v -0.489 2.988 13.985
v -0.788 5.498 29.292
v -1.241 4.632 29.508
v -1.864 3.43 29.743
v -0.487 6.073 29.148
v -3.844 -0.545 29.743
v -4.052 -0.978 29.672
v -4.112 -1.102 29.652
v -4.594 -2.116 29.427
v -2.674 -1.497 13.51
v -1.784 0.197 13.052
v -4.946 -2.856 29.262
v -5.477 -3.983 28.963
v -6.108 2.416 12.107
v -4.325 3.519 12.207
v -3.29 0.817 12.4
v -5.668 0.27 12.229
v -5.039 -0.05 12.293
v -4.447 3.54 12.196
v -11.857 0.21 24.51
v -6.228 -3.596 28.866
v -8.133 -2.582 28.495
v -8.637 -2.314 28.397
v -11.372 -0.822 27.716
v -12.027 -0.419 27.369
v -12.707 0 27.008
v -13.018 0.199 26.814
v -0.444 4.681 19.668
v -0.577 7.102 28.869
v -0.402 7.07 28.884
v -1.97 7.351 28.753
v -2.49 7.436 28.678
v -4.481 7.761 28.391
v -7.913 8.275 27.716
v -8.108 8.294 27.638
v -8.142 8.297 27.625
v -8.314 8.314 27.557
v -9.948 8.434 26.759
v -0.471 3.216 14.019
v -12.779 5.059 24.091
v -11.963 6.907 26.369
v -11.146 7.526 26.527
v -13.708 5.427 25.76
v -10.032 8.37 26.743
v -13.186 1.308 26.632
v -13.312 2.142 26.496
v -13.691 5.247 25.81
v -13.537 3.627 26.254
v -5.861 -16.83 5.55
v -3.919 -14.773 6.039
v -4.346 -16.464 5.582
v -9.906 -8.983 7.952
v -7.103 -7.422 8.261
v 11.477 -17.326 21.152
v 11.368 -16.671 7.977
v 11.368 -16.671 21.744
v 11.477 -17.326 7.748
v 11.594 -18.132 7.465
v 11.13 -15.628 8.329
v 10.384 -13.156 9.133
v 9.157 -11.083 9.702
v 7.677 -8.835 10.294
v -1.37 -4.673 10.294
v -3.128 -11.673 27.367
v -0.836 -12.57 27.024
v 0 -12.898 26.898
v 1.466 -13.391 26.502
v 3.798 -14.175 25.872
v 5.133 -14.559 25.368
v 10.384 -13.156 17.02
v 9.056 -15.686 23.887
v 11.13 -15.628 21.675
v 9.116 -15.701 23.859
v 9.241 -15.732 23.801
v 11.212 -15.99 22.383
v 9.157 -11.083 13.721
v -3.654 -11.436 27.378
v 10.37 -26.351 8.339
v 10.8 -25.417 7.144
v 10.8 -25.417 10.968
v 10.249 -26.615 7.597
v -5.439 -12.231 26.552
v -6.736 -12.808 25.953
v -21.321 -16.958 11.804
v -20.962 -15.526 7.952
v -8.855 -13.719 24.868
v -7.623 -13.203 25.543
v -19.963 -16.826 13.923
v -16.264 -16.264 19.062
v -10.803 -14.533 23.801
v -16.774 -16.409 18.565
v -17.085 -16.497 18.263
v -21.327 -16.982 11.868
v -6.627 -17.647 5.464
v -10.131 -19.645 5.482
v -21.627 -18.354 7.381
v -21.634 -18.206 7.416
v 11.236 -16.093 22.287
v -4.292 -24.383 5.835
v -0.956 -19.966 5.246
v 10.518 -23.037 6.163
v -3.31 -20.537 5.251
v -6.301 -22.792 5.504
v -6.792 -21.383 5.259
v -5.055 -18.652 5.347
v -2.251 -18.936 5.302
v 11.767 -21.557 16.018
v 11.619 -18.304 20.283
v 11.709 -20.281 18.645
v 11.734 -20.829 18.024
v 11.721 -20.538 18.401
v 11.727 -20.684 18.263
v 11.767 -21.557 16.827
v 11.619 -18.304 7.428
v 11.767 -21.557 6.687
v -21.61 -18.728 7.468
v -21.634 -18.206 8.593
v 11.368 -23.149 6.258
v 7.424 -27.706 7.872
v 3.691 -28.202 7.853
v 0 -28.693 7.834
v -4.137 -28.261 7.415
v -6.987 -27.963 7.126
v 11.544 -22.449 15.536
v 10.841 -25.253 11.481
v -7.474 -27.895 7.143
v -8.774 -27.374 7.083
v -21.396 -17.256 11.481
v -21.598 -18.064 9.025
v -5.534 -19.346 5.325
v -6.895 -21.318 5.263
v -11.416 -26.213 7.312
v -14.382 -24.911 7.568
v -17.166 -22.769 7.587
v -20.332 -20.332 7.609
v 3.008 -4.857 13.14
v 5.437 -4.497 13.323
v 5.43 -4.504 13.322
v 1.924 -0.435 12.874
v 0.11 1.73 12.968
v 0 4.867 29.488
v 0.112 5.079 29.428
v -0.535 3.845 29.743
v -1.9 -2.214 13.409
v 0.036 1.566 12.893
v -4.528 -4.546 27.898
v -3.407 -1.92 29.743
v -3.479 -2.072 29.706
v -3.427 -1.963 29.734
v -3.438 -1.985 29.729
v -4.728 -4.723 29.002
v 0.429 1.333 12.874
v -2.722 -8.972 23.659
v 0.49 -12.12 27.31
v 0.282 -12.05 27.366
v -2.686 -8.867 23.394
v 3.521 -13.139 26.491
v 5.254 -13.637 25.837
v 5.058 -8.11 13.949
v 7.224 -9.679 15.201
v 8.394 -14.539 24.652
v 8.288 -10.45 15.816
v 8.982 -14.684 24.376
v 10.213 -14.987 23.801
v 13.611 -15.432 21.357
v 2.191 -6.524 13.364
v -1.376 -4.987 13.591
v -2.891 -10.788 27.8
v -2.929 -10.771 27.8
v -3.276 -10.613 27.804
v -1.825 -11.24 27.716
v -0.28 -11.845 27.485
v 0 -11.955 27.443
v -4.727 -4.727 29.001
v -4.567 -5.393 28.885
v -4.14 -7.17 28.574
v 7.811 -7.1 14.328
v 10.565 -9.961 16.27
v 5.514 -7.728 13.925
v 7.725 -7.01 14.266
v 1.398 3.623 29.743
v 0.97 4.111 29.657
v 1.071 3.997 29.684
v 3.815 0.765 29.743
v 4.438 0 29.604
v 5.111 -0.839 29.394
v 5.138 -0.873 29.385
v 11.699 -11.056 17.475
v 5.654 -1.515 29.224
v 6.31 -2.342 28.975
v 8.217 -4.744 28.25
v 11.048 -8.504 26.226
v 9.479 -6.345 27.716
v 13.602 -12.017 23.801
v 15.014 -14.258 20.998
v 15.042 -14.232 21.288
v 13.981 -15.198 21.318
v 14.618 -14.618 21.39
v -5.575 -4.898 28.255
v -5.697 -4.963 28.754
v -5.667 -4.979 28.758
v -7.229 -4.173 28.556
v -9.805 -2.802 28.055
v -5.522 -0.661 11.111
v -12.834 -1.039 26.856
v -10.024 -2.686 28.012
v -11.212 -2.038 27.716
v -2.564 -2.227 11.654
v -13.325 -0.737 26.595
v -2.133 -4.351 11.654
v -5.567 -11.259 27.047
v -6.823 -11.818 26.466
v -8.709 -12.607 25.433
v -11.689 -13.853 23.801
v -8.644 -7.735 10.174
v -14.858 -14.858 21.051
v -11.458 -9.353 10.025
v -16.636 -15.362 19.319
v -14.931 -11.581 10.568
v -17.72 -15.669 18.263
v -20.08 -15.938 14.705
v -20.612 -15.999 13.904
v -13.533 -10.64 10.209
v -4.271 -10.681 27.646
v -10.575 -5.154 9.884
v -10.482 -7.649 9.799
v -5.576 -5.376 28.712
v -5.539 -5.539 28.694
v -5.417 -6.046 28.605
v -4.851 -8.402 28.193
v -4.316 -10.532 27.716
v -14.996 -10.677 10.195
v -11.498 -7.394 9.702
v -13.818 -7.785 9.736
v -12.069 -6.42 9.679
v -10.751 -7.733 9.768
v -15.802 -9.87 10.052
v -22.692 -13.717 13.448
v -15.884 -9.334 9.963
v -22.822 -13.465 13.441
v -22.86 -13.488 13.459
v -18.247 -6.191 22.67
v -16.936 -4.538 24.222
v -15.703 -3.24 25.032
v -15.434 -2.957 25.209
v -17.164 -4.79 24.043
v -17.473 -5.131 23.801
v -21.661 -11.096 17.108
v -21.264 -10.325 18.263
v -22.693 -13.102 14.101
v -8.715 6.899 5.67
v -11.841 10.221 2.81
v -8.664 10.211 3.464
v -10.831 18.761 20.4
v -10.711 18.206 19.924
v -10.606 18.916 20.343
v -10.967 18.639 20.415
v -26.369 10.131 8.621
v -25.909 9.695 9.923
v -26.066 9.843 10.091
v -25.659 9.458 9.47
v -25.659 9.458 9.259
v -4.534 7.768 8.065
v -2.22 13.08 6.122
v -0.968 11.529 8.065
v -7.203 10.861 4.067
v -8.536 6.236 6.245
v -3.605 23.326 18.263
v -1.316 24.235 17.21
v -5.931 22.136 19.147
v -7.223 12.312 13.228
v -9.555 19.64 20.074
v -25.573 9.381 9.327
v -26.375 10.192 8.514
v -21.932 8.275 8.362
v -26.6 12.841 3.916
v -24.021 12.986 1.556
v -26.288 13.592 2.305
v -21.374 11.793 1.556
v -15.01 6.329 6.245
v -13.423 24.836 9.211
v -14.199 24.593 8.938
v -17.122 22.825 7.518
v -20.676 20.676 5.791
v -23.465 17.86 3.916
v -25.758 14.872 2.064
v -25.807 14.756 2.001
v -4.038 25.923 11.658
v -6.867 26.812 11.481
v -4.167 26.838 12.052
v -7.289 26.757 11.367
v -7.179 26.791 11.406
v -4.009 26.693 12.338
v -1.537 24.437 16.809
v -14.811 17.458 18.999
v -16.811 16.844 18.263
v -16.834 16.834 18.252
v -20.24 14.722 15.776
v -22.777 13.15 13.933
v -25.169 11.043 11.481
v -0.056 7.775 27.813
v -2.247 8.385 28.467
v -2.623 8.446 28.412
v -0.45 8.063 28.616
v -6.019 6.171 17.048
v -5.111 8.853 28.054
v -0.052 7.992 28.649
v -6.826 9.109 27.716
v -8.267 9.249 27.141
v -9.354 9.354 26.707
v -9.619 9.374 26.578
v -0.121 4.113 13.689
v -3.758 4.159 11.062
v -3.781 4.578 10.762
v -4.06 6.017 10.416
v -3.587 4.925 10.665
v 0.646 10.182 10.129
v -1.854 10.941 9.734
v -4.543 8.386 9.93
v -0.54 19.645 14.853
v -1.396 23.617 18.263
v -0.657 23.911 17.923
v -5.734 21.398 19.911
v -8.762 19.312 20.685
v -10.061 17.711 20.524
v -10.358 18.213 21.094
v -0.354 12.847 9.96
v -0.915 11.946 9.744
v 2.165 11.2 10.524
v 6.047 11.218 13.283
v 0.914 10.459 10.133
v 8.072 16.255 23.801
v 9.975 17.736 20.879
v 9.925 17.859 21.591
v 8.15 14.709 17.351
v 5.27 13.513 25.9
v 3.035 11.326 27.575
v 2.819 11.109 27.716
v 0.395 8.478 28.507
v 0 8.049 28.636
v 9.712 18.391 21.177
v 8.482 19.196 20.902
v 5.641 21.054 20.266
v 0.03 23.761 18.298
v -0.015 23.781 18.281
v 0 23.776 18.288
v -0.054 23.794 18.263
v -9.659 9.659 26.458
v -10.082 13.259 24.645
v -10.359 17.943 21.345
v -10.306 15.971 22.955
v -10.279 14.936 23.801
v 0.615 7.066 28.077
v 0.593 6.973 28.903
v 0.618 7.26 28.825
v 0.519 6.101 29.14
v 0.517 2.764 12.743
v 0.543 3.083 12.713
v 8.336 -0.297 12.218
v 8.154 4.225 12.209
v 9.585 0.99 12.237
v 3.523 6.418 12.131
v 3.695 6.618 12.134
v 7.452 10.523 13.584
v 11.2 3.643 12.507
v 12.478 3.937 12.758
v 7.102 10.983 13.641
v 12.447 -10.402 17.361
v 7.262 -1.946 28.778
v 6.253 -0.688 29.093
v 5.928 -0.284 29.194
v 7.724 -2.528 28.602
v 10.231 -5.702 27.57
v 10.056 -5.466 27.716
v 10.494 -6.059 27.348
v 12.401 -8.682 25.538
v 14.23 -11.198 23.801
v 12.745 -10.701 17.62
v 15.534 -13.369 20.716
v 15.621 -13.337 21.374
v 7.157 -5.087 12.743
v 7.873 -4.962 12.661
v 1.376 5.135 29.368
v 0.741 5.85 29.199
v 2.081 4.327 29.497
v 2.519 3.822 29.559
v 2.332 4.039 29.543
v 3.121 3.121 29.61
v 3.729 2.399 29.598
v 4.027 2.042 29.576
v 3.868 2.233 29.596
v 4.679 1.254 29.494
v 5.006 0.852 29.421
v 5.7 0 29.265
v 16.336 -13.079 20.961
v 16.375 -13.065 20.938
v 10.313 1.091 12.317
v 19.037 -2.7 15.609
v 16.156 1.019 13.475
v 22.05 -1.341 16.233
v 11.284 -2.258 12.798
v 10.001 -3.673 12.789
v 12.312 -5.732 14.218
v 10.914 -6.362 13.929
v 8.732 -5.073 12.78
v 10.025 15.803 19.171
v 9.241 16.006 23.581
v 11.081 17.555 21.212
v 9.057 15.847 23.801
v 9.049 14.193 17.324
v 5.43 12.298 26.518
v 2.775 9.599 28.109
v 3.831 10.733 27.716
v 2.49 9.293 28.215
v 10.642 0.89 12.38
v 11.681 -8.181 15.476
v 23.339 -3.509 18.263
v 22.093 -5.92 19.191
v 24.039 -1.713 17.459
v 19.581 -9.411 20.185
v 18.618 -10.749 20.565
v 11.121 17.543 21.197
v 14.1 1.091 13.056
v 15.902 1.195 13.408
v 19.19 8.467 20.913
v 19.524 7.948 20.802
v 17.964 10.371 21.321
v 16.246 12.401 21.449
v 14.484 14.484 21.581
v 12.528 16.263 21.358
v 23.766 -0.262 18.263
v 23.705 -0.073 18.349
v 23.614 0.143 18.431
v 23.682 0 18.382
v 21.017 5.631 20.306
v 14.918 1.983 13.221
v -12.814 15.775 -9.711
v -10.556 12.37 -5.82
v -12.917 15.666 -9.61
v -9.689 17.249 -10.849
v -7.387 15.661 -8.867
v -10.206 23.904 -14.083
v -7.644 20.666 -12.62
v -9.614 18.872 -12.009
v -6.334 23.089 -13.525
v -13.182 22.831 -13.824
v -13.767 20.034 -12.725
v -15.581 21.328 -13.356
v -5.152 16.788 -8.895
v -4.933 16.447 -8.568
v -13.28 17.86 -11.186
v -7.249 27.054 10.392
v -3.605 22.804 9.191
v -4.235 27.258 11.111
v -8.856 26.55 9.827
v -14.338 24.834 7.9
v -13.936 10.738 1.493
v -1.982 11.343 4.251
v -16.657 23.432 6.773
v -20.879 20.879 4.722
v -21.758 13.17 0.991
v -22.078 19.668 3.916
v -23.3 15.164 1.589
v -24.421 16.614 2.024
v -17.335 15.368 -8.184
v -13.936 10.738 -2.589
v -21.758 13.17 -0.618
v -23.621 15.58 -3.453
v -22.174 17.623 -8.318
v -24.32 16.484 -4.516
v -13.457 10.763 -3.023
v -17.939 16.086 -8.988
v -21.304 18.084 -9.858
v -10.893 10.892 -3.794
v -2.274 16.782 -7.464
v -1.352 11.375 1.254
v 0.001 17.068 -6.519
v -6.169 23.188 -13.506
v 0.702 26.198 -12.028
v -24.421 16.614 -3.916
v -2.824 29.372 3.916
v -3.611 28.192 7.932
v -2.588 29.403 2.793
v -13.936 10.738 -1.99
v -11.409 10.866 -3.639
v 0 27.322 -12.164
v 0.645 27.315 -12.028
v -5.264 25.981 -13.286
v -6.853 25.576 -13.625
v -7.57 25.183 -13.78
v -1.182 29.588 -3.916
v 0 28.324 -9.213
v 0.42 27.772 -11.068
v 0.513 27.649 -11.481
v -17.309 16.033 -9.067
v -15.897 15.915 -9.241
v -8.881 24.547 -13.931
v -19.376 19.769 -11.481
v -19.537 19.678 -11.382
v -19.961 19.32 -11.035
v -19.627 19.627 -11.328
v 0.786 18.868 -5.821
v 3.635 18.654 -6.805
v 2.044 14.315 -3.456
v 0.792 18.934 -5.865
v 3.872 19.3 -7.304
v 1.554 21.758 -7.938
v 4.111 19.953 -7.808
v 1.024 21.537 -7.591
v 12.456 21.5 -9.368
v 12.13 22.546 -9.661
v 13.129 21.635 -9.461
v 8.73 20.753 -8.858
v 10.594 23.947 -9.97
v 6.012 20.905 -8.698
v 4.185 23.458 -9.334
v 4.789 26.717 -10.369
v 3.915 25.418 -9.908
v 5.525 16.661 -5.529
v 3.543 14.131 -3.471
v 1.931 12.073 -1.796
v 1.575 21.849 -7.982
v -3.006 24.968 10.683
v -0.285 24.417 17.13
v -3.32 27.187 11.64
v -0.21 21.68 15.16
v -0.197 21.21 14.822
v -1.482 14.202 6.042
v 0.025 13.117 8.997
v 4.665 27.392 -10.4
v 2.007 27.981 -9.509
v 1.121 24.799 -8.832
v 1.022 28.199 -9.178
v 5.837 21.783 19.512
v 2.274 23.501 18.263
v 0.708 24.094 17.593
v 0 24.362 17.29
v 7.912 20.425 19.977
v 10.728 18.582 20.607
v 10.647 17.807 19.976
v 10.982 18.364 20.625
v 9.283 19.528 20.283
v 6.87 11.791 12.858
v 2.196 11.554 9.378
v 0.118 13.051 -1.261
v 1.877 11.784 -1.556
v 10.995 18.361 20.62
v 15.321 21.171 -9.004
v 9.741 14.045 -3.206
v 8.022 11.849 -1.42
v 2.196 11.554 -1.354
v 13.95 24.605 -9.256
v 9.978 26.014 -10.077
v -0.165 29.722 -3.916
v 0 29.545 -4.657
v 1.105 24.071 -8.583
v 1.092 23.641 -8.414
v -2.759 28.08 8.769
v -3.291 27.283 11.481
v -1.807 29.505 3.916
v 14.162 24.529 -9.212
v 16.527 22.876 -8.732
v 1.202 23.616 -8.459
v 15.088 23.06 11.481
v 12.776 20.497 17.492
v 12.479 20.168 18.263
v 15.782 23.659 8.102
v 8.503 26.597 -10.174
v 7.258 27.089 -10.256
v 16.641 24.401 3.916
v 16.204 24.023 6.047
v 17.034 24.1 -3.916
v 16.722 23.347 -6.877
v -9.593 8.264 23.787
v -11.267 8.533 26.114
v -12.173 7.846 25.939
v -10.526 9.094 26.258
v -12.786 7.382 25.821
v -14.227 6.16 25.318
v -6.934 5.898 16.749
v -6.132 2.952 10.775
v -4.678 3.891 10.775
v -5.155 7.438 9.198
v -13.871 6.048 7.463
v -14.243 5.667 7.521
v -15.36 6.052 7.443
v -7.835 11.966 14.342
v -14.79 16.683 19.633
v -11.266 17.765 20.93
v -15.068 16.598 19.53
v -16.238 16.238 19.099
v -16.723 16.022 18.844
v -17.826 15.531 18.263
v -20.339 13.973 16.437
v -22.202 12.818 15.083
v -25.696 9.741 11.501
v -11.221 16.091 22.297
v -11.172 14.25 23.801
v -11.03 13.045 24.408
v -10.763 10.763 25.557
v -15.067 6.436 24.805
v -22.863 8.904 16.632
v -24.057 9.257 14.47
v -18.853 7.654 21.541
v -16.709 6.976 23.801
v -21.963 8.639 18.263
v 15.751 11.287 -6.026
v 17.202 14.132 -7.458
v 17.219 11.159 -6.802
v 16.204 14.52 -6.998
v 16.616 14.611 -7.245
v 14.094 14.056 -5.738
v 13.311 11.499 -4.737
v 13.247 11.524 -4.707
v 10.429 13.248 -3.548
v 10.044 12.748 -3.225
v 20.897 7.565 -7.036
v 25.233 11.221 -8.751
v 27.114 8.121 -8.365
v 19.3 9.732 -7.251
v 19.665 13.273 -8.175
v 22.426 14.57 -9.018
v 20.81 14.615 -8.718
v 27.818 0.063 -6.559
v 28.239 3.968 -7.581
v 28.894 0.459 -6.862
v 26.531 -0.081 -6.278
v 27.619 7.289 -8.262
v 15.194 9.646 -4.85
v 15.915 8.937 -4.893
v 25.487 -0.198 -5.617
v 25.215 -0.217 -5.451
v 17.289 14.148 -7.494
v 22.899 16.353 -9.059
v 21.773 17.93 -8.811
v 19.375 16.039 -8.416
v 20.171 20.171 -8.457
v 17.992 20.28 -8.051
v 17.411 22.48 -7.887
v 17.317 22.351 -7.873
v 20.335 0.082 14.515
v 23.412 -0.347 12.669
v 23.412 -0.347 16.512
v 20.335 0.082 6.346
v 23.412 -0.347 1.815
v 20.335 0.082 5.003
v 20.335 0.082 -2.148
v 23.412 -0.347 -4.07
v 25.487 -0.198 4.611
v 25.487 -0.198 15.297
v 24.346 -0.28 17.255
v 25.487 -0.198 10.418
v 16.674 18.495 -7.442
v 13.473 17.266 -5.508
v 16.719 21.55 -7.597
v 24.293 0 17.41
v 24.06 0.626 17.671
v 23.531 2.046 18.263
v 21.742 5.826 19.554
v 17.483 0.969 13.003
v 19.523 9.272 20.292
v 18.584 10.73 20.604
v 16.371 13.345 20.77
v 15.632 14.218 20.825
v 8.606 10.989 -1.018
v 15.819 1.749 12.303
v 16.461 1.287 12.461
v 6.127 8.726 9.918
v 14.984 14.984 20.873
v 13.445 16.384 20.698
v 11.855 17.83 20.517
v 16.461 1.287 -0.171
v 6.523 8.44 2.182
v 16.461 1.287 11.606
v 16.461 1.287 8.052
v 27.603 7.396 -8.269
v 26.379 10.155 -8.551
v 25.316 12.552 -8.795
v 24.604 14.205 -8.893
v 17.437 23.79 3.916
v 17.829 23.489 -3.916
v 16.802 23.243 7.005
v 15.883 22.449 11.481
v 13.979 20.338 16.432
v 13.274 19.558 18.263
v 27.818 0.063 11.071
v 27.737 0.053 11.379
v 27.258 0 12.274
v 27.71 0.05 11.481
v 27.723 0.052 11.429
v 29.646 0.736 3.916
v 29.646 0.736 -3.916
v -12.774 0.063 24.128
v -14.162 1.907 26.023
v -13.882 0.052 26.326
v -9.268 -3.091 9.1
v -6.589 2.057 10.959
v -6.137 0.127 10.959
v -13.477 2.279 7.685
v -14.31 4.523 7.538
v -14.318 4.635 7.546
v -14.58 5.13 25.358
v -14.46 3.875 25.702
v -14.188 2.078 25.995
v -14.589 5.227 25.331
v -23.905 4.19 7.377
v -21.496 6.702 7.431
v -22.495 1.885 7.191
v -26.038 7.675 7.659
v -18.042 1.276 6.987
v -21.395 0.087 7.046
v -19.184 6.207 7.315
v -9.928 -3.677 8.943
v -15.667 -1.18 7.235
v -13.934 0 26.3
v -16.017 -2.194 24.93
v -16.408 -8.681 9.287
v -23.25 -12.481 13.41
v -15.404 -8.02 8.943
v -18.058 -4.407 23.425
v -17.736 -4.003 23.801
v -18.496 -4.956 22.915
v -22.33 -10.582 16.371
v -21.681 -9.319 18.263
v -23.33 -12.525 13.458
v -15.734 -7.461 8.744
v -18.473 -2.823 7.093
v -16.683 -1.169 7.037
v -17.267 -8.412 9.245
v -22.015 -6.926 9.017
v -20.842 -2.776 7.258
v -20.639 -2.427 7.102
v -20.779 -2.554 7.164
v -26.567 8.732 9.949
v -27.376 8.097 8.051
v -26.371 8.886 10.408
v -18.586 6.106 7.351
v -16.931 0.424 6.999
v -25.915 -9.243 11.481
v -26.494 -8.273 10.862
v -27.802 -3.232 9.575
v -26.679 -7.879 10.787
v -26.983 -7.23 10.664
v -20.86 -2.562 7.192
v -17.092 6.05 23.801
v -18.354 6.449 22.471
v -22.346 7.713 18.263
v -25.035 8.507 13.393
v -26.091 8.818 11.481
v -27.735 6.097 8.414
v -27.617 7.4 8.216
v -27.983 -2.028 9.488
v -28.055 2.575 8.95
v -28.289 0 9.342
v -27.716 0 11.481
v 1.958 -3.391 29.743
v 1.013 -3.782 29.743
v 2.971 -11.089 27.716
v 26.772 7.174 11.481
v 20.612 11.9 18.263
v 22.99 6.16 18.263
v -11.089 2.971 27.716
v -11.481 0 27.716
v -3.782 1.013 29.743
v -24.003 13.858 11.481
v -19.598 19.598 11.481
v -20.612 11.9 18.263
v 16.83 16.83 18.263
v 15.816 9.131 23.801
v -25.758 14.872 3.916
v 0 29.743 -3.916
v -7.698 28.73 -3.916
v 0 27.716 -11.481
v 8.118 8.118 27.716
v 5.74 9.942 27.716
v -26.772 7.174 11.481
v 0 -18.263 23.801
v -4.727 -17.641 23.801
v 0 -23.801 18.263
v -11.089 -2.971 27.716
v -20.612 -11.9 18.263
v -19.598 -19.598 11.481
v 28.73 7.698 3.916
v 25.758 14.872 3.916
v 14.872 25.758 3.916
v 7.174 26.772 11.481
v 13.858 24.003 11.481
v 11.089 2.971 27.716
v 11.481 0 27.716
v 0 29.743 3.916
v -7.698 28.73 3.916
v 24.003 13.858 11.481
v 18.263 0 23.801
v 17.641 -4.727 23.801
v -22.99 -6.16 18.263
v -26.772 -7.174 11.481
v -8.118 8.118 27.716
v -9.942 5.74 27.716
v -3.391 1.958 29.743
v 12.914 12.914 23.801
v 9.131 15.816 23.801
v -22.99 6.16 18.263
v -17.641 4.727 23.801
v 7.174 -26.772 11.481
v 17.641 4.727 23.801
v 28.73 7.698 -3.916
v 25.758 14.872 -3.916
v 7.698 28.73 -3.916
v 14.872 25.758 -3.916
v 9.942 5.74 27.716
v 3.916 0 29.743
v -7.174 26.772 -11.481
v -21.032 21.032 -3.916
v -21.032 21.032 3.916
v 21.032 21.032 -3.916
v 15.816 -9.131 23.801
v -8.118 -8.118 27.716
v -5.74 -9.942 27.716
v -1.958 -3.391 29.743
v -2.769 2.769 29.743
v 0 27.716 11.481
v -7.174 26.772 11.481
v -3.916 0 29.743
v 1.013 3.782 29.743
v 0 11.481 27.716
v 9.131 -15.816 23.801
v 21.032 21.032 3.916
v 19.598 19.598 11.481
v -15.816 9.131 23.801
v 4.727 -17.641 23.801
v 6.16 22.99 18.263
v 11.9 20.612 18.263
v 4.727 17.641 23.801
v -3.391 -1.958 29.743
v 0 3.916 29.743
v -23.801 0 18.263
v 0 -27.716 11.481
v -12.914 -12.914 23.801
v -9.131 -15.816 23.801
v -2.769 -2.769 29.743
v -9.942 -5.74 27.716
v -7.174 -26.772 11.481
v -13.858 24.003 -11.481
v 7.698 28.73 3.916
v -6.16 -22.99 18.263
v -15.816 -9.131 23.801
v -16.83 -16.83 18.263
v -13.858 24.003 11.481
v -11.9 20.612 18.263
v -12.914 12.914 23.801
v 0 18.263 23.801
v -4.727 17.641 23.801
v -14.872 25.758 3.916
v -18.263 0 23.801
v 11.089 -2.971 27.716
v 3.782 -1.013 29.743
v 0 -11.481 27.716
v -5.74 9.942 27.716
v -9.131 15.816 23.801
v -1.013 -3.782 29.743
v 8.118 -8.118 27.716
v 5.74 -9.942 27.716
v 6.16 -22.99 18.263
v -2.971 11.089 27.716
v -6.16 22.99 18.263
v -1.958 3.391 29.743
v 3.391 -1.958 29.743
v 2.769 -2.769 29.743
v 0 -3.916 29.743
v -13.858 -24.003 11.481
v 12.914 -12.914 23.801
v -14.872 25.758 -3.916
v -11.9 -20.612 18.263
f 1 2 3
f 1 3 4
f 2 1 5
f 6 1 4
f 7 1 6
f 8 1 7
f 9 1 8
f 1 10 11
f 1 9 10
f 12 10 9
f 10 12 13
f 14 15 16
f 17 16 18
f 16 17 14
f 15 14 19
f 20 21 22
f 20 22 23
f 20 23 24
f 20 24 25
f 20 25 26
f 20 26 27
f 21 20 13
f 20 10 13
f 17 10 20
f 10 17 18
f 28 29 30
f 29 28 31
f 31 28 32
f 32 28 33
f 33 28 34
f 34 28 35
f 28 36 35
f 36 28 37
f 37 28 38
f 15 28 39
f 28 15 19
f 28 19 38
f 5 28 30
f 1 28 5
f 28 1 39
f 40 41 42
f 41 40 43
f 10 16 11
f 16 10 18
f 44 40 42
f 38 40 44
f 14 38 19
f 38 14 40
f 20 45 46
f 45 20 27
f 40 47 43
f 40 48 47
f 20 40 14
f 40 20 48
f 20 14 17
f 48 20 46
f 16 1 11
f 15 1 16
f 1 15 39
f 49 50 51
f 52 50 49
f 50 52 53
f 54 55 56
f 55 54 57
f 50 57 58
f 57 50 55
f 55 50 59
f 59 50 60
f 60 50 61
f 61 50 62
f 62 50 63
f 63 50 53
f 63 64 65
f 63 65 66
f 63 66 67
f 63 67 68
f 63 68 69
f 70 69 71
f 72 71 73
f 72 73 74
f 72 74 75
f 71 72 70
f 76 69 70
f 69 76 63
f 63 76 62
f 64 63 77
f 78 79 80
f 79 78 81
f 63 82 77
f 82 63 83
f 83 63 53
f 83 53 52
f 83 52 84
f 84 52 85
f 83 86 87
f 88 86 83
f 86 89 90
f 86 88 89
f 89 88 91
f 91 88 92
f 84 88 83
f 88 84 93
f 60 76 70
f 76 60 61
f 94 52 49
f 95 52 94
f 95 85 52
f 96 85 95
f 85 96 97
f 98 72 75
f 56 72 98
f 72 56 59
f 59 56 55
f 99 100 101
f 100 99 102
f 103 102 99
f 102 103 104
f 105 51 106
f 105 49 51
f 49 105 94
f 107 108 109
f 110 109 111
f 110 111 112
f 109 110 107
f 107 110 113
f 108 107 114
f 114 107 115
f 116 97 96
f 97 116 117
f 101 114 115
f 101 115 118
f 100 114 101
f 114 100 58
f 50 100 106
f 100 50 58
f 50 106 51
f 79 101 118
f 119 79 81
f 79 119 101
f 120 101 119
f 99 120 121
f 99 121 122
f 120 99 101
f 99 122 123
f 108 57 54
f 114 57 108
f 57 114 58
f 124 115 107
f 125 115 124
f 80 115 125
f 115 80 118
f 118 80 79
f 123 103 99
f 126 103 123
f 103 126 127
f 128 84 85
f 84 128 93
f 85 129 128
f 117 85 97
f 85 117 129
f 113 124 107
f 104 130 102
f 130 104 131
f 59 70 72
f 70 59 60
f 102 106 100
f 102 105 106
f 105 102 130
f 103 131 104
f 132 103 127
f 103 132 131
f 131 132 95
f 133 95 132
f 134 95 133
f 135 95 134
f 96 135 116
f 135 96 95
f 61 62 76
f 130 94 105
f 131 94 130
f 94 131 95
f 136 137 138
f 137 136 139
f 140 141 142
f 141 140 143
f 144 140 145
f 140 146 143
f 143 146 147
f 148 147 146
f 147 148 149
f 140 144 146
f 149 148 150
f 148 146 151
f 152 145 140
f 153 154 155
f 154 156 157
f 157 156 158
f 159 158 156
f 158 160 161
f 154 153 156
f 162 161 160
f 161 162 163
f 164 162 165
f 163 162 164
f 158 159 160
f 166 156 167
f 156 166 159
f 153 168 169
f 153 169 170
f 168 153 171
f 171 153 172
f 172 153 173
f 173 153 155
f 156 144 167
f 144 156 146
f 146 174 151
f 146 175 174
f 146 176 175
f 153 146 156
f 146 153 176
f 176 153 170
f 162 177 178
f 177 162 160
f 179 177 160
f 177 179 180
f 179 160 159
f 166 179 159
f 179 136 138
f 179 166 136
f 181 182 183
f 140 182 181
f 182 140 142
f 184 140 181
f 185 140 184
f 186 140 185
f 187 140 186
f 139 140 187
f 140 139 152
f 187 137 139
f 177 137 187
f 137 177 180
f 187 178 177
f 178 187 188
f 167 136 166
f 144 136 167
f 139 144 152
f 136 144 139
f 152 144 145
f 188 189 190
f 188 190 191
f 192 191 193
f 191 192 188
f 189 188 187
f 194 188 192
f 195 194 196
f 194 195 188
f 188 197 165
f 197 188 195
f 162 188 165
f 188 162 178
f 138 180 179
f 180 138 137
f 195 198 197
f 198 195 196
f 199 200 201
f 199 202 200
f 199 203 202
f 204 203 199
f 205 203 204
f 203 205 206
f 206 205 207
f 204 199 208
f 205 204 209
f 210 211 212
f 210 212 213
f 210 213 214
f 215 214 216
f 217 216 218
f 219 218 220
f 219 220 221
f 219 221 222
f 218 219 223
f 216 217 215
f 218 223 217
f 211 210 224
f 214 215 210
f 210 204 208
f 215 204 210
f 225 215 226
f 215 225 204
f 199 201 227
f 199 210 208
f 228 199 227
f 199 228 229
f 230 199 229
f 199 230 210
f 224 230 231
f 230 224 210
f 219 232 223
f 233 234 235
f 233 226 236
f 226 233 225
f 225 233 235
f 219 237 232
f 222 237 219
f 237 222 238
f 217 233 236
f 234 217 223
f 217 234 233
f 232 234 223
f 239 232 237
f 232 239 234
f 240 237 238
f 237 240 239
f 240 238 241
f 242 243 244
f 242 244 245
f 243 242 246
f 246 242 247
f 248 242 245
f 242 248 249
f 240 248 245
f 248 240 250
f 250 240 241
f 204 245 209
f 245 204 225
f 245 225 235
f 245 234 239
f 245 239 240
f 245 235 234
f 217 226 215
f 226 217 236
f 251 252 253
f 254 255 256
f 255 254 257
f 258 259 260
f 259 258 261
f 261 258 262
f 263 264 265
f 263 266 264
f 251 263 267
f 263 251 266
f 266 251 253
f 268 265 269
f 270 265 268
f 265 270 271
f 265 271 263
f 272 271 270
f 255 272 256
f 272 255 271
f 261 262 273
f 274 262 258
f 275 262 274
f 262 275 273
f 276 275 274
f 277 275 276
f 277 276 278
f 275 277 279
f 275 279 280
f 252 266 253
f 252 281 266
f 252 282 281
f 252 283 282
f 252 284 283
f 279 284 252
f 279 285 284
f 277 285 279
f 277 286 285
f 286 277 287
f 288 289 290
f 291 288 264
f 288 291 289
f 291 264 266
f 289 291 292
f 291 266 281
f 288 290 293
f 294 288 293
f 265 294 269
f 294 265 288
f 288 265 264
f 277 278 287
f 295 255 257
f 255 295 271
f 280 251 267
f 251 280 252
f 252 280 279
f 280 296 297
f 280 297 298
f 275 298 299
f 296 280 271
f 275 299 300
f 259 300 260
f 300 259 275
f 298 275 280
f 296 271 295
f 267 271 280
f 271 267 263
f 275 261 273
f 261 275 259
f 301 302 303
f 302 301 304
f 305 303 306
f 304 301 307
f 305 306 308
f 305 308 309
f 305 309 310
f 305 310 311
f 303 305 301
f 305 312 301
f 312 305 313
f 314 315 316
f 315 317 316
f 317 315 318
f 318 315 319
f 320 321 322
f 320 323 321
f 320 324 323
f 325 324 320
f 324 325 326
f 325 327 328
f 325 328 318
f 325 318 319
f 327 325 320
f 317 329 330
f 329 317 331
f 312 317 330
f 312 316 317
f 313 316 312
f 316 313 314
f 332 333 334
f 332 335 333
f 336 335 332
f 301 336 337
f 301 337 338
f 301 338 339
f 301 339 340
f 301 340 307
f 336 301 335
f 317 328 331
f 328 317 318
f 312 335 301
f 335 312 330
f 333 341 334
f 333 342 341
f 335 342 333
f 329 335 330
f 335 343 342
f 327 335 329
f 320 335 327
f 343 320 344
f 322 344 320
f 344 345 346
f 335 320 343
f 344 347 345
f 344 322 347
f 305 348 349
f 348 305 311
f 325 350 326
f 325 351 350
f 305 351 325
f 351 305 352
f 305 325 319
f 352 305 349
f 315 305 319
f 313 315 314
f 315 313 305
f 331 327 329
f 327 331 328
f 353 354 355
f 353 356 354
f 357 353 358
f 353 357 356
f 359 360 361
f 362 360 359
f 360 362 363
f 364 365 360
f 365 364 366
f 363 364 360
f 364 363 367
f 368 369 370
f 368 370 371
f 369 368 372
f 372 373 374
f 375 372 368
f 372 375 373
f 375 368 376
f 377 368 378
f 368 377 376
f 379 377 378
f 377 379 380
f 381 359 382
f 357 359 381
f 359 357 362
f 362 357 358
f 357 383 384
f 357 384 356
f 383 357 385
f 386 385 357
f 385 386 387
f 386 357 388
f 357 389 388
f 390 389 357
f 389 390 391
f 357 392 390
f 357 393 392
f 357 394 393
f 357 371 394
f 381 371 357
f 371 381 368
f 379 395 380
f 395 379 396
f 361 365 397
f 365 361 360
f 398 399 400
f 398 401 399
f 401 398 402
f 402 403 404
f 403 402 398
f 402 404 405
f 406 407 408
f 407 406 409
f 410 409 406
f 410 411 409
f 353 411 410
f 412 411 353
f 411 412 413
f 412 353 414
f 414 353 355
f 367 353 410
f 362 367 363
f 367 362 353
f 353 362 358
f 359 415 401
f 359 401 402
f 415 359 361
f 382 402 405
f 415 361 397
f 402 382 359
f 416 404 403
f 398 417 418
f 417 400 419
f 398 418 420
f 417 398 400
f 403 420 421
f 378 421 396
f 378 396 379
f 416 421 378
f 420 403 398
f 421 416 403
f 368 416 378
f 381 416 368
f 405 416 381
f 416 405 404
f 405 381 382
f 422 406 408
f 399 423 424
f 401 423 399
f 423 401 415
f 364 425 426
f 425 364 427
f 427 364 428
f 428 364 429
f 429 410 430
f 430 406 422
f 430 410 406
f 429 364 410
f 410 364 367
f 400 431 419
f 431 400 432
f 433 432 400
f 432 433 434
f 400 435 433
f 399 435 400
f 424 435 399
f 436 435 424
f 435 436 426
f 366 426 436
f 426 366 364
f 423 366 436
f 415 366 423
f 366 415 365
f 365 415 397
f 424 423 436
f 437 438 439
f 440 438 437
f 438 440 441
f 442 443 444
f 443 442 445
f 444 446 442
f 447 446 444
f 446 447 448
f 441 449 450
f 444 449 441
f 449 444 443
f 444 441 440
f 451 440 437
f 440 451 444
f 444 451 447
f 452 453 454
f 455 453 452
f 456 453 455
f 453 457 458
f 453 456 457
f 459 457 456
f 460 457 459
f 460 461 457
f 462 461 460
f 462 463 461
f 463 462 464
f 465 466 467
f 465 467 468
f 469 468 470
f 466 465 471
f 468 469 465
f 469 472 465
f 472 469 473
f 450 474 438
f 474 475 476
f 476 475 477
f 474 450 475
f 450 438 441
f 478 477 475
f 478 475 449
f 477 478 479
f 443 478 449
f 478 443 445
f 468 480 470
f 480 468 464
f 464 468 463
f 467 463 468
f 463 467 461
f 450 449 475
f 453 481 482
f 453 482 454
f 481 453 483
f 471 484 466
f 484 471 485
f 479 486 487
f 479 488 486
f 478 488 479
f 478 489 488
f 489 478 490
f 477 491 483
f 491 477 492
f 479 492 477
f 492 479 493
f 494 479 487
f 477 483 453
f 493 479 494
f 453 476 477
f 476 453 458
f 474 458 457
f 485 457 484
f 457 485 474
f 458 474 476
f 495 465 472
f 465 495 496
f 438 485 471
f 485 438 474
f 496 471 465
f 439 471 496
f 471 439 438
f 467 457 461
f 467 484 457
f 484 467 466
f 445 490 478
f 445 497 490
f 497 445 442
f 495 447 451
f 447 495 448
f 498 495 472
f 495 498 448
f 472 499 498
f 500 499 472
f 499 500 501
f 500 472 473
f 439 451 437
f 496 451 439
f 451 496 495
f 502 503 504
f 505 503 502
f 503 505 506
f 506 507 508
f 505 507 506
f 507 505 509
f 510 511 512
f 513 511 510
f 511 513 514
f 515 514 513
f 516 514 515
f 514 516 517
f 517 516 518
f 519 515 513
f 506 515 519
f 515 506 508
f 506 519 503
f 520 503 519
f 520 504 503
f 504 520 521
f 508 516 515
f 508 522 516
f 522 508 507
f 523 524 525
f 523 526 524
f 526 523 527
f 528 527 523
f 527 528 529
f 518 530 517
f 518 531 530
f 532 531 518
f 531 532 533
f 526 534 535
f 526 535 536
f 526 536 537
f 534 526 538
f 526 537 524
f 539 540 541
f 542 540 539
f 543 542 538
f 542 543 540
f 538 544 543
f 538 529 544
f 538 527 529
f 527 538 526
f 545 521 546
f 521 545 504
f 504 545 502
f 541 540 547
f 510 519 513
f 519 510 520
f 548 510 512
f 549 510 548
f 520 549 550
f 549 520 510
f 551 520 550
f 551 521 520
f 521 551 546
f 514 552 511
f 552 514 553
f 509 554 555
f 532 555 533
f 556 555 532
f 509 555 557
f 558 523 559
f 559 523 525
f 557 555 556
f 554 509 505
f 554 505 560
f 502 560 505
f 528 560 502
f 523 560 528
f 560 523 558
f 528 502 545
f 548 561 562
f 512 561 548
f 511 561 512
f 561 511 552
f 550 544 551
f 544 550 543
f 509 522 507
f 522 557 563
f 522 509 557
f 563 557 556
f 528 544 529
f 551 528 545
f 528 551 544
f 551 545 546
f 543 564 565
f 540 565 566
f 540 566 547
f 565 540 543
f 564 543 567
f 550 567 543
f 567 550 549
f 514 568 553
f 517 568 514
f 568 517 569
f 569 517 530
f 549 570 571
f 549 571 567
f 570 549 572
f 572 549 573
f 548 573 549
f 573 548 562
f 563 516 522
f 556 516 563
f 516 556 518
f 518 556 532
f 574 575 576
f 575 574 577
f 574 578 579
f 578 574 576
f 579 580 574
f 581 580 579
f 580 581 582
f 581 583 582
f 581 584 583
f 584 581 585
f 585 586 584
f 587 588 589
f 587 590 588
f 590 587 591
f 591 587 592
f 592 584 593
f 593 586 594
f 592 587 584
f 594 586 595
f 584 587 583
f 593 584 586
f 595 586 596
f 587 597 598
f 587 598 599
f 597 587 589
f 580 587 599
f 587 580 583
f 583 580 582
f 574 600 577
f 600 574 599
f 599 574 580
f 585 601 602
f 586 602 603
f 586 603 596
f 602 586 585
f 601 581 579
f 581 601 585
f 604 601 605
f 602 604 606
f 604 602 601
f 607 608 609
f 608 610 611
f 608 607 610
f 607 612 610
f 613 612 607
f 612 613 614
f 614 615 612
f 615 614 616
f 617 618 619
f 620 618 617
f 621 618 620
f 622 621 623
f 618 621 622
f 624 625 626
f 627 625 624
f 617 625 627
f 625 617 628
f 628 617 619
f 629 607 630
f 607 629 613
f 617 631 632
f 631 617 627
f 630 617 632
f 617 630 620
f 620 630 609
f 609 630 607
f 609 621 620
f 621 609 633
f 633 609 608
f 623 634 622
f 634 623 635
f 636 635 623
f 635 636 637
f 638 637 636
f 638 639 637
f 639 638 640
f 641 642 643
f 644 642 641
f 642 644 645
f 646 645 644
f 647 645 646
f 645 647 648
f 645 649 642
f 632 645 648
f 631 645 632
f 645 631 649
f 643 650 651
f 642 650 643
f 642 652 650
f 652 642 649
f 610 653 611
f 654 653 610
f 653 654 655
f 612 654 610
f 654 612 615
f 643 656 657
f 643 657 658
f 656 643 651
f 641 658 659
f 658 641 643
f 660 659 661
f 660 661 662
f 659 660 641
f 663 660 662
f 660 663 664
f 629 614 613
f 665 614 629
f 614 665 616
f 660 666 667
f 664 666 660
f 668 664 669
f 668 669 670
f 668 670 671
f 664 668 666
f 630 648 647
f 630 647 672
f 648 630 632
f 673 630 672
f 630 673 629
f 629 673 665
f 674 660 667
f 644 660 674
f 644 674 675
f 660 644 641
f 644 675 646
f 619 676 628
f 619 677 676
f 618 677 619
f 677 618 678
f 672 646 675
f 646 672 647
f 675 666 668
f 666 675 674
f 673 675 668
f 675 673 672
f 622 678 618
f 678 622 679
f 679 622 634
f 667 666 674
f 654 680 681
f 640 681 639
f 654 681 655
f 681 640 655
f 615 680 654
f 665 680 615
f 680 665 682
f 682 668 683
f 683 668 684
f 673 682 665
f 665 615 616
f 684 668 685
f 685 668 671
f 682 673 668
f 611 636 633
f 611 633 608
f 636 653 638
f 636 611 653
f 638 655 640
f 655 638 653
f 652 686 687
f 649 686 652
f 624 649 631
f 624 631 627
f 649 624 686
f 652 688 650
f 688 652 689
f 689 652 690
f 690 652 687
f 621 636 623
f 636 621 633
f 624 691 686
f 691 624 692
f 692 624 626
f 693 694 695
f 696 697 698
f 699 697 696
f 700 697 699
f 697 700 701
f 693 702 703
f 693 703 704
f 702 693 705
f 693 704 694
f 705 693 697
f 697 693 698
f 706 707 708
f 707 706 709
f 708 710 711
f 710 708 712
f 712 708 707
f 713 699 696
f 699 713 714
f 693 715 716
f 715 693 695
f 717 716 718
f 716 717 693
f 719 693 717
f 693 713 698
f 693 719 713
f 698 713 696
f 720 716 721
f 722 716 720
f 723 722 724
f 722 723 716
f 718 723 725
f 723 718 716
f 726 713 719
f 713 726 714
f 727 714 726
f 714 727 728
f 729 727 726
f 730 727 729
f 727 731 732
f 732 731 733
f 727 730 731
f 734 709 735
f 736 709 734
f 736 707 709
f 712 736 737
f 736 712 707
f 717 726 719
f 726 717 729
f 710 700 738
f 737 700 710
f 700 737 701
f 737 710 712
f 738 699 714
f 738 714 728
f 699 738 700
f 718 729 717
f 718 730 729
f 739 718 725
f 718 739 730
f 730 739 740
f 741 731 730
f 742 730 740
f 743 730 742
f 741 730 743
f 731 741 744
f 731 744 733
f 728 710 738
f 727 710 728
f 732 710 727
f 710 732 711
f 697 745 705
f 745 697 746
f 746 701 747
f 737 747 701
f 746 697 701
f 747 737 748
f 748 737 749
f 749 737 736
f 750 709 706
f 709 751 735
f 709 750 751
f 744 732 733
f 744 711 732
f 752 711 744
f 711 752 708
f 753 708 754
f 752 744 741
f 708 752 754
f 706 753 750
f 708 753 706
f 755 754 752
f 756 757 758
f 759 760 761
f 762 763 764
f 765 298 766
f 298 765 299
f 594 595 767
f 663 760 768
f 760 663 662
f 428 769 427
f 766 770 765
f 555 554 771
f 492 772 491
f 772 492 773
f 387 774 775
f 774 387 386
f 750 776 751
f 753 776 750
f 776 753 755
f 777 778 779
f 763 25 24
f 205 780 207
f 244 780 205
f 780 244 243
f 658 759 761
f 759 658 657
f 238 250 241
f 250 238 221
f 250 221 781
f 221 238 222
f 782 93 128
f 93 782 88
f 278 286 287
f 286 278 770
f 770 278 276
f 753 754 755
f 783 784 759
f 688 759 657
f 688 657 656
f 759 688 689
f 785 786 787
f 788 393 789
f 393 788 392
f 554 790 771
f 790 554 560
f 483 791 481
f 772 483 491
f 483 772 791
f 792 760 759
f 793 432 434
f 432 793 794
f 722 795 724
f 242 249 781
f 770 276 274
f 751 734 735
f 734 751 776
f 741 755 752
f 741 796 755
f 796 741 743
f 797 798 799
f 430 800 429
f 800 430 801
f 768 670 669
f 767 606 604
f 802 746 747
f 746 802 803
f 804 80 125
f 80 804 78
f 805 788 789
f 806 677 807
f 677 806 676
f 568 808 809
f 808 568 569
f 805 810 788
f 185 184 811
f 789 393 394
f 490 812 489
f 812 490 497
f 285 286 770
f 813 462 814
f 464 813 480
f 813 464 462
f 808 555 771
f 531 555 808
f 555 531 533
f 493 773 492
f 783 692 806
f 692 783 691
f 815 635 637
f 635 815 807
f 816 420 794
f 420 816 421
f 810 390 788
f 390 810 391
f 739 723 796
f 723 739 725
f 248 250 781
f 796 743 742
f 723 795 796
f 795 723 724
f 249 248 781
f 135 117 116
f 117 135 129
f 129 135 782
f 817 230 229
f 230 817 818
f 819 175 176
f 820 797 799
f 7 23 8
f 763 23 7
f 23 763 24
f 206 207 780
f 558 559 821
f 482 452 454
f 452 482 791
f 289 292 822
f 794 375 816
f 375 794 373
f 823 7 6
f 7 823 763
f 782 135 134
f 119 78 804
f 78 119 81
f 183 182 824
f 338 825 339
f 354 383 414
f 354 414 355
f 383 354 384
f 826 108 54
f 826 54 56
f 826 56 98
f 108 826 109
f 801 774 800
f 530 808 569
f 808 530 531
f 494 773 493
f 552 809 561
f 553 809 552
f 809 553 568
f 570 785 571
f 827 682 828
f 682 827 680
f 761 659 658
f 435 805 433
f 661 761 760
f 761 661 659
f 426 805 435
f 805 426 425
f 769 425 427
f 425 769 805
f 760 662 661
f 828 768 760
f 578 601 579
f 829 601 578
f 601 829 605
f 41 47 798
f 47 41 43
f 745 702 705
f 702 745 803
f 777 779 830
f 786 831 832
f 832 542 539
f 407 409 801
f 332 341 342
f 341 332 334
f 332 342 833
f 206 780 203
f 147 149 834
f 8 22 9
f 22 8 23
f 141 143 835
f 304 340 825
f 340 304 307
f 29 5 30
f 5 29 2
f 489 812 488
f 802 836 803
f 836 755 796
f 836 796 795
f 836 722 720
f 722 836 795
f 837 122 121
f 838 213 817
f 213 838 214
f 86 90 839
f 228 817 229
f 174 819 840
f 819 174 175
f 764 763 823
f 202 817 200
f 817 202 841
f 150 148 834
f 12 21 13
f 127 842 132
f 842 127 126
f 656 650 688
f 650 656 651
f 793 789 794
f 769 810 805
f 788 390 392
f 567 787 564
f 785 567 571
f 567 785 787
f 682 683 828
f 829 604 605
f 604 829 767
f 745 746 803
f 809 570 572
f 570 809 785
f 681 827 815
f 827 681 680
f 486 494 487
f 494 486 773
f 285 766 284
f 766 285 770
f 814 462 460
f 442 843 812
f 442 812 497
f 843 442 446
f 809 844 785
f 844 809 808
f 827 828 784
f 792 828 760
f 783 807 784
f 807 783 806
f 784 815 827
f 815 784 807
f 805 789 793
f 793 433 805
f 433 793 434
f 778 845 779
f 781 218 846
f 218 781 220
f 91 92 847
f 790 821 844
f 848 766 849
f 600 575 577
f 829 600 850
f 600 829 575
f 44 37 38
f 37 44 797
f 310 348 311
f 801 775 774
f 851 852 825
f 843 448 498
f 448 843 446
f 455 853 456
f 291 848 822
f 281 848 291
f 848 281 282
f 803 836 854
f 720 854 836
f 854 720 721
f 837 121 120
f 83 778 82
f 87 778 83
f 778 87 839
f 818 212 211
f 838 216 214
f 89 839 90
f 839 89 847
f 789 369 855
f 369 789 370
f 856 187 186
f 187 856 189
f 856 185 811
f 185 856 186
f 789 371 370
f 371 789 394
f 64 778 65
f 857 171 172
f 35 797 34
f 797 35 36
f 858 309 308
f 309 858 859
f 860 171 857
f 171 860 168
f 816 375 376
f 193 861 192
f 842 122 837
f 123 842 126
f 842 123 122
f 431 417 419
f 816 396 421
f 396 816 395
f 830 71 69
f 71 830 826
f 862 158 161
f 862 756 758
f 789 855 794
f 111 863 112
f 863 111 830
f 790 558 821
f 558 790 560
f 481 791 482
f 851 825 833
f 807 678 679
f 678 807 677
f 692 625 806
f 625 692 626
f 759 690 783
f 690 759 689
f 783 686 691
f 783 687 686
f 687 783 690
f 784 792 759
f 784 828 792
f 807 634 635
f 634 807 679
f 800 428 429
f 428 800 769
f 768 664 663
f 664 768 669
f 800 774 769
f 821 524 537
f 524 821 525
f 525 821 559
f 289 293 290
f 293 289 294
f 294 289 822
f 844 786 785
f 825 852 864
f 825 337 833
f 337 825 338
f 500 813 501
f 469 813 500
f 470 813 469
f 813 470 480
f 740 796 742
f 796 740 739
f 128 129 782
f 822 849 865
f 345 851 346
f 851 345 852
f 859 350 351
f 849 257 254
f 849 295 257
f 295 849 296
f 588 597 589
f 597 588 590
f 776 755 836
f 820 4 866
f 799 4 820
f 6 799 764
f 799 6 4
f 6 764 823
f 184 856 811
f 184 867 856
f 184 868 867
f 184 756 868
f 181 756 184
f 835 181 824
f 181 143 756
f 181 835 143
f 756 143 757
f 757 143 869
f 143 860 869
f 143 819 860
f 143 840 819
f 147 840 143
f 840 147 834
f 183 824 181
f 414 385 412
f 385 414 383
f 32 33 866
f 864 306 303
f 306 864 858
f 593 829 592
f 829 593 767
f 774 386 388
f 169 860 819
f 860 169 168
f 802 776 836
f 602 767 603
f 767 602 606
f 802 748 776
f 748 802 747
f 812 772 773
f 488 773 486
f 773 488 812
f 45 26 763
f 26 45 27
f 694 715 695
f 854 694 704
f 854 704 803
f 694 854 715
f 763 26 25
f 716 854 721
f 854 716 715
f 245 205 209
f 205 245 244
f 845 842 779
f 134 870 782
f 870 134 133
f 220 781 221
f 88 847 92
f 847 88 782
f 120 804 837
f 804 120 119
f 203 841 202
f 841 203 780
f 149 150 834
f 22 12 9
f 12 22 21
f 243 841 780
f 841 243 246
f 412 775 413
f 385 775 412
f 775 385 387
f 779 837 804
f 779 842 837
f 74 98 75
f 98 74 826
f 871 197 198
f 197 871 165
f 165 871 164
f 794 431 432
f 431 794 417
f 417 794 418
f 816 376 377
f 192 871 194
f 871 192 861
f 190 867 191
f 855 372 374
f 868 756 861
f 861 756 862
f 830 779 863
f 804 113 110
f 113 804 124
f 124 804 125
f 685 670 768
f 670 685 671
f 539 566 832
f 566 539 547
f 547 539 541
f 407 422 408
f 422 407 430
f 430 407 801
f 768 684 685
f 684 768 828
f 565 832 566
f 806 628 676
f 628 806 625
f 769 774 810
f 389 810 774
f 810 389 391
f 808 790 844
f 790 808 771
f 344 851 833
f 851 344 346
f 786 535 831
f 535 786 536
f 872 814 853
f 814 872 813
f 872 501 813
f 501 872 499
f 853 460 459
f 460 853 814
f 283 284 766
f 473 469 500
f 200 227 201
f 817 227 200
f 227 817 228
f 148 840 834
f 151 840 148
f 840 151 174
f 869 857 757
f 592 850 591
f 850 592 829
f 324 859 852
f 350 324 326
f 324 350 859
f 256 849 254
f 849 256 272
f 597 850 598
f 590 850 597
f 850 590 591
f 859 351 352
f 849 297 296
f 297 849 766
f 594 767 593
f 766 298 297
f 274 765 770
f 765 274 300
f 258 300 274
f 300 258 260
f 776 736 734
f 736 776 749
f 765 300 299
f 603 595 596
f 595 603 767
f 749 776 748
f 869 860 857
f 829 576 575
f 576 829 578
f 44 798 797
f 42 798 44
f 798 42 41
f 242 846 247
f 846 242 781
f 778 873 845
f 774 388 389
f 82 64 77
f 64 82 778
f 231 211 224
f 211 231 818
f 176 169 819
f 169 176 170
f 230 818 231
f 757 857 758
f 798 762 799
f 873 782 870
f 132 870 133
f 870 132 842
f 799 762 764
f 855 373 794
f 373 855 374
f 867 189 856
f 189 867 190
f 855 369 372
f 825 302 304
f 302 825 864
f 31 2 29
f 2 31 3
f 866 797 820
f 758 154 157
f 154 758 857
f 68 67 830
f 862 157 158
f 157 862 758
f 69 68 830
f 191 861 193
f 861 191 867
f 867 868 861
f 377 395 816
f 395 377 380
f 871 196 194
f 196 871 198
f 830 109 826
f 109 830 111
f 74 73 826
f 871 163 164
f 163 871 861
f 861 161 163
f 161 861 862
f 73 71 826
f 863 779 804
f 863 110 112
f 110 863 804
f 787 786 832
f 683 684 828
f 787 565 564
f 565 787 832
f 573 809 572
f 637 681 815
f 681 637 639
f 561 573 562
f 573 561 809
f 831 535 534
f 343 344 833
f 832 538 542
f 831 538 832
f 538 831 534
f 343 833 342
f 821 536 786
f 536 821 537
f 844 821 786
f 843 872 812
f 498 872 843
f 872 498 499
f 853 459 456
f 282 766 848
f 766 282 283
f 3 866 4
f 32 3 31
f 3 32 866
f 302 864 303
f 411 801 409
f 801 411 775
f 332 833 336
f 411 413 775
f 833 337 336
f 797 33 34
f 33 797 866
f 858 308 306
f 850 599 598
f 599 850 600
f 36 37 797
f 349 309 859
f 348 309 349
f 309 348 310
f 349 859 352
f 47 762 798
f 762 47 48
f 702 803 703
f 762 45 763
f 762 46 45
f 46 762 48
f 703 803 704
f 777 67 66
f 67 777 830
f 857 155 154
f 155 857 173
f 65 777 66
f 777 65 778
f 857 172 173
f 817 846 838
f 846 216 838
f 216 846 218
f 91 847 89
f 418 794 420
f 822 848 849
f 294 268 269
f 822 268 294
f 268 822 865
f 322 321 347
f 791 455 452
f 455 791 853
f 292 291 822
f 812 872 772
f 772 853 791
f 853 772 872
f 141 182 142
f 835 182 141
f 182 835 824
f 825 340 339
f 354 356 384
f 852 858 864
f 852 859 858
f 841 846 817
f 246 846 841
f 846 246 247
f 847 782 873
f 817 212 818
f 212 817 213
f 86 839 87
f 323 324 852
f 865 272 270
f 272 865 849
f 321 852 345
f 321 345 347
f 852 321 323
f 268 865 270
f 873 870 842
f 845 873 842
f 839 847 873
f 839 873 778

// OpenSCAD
r = 30;
thickness = 2;
point_number = 12;
fn = 24;
stl_file = "";

module voronoi_sphere(r, thickness, point_number, fn, stl_file = "") {
    $fn = fn;
    if(stl_file == "") {

        zas = rands(0, 359, point_number);
        yas = rands(0, 179, point_number);

        points = [
            for(i = [0:point_number - 1])
            let(cyas = cos(yas[i]))
            [
                r * cyas * cos(zas[i]), 
                r * cyas * sin(zas[i]), 
                r * sin(yas[i])
            ]
        ];

        intersection() {
            sphere(r);
            voronoi3d(points);
        }  
    }
    else {
        difference() {
            sphere(r);
            scale(1.01) import(stl_file);
            sphere(r - thickness);
        }        
    }
}

voronoi_sphere(r, thickness, point_number, fn, stl_file);


    
/**
 * The dotSCAD library
 * @copyright Justin Lin, 2017
 * @license https://opensource.org/licenses/lgpl-3.0.html
 *
 * @see https://github.com/JustinSDK/dotSCAD
*/

function __angy_angz(p1, p2) = 
    let(
        dx = p2[0] - p1[0],
        dy = p2[1] - p1[1],
        dz = p2[2] - p1[2],
        ya = atan2(dz, sqrt(pow(dx, 2) + pow(dy, 2))),
        za = atan2(dy, dx)
    ) [ya, za];


// slow but workable

module voronoi3d(points, spacing = 1, space_type = "cube") {
    xs = [for(p = points) p[0]];
    ys = [for(p = points) abs(p[1])];
    zs = [for(p = points) abs(p[2])];

    space_size = max([(max(xs) -  min(xs) / 2), (max(ys) -  min(ys)) / 2, (max(zs) -  min(zs)) / 2]);    
    half_space_size = 0.5 * space_size; 
    offset_leng = spacing * 0.5 + half_space_size;

    function normalize(v) = v / norm(v);
    
    module space(pt) {
        intersection_for(p = points) {
            if(pt != p) {
                v = p - pt;
                ryz = __angy_angz(p, pt);

                translate((pt + p) / 2 - normalize(v) * offset_leng)
                    rotate([0, -ryz[0], ryz[1]]) 
                    if(space_type == "cube") {
                        cube(space_size, center = true); 
                    }
                    else if(space_type == "sphere") {
                        sphere(half_space_size); 
                    }
            }
        }
    }    
    
    for(p = points) {	
        space(p);
    }
}
